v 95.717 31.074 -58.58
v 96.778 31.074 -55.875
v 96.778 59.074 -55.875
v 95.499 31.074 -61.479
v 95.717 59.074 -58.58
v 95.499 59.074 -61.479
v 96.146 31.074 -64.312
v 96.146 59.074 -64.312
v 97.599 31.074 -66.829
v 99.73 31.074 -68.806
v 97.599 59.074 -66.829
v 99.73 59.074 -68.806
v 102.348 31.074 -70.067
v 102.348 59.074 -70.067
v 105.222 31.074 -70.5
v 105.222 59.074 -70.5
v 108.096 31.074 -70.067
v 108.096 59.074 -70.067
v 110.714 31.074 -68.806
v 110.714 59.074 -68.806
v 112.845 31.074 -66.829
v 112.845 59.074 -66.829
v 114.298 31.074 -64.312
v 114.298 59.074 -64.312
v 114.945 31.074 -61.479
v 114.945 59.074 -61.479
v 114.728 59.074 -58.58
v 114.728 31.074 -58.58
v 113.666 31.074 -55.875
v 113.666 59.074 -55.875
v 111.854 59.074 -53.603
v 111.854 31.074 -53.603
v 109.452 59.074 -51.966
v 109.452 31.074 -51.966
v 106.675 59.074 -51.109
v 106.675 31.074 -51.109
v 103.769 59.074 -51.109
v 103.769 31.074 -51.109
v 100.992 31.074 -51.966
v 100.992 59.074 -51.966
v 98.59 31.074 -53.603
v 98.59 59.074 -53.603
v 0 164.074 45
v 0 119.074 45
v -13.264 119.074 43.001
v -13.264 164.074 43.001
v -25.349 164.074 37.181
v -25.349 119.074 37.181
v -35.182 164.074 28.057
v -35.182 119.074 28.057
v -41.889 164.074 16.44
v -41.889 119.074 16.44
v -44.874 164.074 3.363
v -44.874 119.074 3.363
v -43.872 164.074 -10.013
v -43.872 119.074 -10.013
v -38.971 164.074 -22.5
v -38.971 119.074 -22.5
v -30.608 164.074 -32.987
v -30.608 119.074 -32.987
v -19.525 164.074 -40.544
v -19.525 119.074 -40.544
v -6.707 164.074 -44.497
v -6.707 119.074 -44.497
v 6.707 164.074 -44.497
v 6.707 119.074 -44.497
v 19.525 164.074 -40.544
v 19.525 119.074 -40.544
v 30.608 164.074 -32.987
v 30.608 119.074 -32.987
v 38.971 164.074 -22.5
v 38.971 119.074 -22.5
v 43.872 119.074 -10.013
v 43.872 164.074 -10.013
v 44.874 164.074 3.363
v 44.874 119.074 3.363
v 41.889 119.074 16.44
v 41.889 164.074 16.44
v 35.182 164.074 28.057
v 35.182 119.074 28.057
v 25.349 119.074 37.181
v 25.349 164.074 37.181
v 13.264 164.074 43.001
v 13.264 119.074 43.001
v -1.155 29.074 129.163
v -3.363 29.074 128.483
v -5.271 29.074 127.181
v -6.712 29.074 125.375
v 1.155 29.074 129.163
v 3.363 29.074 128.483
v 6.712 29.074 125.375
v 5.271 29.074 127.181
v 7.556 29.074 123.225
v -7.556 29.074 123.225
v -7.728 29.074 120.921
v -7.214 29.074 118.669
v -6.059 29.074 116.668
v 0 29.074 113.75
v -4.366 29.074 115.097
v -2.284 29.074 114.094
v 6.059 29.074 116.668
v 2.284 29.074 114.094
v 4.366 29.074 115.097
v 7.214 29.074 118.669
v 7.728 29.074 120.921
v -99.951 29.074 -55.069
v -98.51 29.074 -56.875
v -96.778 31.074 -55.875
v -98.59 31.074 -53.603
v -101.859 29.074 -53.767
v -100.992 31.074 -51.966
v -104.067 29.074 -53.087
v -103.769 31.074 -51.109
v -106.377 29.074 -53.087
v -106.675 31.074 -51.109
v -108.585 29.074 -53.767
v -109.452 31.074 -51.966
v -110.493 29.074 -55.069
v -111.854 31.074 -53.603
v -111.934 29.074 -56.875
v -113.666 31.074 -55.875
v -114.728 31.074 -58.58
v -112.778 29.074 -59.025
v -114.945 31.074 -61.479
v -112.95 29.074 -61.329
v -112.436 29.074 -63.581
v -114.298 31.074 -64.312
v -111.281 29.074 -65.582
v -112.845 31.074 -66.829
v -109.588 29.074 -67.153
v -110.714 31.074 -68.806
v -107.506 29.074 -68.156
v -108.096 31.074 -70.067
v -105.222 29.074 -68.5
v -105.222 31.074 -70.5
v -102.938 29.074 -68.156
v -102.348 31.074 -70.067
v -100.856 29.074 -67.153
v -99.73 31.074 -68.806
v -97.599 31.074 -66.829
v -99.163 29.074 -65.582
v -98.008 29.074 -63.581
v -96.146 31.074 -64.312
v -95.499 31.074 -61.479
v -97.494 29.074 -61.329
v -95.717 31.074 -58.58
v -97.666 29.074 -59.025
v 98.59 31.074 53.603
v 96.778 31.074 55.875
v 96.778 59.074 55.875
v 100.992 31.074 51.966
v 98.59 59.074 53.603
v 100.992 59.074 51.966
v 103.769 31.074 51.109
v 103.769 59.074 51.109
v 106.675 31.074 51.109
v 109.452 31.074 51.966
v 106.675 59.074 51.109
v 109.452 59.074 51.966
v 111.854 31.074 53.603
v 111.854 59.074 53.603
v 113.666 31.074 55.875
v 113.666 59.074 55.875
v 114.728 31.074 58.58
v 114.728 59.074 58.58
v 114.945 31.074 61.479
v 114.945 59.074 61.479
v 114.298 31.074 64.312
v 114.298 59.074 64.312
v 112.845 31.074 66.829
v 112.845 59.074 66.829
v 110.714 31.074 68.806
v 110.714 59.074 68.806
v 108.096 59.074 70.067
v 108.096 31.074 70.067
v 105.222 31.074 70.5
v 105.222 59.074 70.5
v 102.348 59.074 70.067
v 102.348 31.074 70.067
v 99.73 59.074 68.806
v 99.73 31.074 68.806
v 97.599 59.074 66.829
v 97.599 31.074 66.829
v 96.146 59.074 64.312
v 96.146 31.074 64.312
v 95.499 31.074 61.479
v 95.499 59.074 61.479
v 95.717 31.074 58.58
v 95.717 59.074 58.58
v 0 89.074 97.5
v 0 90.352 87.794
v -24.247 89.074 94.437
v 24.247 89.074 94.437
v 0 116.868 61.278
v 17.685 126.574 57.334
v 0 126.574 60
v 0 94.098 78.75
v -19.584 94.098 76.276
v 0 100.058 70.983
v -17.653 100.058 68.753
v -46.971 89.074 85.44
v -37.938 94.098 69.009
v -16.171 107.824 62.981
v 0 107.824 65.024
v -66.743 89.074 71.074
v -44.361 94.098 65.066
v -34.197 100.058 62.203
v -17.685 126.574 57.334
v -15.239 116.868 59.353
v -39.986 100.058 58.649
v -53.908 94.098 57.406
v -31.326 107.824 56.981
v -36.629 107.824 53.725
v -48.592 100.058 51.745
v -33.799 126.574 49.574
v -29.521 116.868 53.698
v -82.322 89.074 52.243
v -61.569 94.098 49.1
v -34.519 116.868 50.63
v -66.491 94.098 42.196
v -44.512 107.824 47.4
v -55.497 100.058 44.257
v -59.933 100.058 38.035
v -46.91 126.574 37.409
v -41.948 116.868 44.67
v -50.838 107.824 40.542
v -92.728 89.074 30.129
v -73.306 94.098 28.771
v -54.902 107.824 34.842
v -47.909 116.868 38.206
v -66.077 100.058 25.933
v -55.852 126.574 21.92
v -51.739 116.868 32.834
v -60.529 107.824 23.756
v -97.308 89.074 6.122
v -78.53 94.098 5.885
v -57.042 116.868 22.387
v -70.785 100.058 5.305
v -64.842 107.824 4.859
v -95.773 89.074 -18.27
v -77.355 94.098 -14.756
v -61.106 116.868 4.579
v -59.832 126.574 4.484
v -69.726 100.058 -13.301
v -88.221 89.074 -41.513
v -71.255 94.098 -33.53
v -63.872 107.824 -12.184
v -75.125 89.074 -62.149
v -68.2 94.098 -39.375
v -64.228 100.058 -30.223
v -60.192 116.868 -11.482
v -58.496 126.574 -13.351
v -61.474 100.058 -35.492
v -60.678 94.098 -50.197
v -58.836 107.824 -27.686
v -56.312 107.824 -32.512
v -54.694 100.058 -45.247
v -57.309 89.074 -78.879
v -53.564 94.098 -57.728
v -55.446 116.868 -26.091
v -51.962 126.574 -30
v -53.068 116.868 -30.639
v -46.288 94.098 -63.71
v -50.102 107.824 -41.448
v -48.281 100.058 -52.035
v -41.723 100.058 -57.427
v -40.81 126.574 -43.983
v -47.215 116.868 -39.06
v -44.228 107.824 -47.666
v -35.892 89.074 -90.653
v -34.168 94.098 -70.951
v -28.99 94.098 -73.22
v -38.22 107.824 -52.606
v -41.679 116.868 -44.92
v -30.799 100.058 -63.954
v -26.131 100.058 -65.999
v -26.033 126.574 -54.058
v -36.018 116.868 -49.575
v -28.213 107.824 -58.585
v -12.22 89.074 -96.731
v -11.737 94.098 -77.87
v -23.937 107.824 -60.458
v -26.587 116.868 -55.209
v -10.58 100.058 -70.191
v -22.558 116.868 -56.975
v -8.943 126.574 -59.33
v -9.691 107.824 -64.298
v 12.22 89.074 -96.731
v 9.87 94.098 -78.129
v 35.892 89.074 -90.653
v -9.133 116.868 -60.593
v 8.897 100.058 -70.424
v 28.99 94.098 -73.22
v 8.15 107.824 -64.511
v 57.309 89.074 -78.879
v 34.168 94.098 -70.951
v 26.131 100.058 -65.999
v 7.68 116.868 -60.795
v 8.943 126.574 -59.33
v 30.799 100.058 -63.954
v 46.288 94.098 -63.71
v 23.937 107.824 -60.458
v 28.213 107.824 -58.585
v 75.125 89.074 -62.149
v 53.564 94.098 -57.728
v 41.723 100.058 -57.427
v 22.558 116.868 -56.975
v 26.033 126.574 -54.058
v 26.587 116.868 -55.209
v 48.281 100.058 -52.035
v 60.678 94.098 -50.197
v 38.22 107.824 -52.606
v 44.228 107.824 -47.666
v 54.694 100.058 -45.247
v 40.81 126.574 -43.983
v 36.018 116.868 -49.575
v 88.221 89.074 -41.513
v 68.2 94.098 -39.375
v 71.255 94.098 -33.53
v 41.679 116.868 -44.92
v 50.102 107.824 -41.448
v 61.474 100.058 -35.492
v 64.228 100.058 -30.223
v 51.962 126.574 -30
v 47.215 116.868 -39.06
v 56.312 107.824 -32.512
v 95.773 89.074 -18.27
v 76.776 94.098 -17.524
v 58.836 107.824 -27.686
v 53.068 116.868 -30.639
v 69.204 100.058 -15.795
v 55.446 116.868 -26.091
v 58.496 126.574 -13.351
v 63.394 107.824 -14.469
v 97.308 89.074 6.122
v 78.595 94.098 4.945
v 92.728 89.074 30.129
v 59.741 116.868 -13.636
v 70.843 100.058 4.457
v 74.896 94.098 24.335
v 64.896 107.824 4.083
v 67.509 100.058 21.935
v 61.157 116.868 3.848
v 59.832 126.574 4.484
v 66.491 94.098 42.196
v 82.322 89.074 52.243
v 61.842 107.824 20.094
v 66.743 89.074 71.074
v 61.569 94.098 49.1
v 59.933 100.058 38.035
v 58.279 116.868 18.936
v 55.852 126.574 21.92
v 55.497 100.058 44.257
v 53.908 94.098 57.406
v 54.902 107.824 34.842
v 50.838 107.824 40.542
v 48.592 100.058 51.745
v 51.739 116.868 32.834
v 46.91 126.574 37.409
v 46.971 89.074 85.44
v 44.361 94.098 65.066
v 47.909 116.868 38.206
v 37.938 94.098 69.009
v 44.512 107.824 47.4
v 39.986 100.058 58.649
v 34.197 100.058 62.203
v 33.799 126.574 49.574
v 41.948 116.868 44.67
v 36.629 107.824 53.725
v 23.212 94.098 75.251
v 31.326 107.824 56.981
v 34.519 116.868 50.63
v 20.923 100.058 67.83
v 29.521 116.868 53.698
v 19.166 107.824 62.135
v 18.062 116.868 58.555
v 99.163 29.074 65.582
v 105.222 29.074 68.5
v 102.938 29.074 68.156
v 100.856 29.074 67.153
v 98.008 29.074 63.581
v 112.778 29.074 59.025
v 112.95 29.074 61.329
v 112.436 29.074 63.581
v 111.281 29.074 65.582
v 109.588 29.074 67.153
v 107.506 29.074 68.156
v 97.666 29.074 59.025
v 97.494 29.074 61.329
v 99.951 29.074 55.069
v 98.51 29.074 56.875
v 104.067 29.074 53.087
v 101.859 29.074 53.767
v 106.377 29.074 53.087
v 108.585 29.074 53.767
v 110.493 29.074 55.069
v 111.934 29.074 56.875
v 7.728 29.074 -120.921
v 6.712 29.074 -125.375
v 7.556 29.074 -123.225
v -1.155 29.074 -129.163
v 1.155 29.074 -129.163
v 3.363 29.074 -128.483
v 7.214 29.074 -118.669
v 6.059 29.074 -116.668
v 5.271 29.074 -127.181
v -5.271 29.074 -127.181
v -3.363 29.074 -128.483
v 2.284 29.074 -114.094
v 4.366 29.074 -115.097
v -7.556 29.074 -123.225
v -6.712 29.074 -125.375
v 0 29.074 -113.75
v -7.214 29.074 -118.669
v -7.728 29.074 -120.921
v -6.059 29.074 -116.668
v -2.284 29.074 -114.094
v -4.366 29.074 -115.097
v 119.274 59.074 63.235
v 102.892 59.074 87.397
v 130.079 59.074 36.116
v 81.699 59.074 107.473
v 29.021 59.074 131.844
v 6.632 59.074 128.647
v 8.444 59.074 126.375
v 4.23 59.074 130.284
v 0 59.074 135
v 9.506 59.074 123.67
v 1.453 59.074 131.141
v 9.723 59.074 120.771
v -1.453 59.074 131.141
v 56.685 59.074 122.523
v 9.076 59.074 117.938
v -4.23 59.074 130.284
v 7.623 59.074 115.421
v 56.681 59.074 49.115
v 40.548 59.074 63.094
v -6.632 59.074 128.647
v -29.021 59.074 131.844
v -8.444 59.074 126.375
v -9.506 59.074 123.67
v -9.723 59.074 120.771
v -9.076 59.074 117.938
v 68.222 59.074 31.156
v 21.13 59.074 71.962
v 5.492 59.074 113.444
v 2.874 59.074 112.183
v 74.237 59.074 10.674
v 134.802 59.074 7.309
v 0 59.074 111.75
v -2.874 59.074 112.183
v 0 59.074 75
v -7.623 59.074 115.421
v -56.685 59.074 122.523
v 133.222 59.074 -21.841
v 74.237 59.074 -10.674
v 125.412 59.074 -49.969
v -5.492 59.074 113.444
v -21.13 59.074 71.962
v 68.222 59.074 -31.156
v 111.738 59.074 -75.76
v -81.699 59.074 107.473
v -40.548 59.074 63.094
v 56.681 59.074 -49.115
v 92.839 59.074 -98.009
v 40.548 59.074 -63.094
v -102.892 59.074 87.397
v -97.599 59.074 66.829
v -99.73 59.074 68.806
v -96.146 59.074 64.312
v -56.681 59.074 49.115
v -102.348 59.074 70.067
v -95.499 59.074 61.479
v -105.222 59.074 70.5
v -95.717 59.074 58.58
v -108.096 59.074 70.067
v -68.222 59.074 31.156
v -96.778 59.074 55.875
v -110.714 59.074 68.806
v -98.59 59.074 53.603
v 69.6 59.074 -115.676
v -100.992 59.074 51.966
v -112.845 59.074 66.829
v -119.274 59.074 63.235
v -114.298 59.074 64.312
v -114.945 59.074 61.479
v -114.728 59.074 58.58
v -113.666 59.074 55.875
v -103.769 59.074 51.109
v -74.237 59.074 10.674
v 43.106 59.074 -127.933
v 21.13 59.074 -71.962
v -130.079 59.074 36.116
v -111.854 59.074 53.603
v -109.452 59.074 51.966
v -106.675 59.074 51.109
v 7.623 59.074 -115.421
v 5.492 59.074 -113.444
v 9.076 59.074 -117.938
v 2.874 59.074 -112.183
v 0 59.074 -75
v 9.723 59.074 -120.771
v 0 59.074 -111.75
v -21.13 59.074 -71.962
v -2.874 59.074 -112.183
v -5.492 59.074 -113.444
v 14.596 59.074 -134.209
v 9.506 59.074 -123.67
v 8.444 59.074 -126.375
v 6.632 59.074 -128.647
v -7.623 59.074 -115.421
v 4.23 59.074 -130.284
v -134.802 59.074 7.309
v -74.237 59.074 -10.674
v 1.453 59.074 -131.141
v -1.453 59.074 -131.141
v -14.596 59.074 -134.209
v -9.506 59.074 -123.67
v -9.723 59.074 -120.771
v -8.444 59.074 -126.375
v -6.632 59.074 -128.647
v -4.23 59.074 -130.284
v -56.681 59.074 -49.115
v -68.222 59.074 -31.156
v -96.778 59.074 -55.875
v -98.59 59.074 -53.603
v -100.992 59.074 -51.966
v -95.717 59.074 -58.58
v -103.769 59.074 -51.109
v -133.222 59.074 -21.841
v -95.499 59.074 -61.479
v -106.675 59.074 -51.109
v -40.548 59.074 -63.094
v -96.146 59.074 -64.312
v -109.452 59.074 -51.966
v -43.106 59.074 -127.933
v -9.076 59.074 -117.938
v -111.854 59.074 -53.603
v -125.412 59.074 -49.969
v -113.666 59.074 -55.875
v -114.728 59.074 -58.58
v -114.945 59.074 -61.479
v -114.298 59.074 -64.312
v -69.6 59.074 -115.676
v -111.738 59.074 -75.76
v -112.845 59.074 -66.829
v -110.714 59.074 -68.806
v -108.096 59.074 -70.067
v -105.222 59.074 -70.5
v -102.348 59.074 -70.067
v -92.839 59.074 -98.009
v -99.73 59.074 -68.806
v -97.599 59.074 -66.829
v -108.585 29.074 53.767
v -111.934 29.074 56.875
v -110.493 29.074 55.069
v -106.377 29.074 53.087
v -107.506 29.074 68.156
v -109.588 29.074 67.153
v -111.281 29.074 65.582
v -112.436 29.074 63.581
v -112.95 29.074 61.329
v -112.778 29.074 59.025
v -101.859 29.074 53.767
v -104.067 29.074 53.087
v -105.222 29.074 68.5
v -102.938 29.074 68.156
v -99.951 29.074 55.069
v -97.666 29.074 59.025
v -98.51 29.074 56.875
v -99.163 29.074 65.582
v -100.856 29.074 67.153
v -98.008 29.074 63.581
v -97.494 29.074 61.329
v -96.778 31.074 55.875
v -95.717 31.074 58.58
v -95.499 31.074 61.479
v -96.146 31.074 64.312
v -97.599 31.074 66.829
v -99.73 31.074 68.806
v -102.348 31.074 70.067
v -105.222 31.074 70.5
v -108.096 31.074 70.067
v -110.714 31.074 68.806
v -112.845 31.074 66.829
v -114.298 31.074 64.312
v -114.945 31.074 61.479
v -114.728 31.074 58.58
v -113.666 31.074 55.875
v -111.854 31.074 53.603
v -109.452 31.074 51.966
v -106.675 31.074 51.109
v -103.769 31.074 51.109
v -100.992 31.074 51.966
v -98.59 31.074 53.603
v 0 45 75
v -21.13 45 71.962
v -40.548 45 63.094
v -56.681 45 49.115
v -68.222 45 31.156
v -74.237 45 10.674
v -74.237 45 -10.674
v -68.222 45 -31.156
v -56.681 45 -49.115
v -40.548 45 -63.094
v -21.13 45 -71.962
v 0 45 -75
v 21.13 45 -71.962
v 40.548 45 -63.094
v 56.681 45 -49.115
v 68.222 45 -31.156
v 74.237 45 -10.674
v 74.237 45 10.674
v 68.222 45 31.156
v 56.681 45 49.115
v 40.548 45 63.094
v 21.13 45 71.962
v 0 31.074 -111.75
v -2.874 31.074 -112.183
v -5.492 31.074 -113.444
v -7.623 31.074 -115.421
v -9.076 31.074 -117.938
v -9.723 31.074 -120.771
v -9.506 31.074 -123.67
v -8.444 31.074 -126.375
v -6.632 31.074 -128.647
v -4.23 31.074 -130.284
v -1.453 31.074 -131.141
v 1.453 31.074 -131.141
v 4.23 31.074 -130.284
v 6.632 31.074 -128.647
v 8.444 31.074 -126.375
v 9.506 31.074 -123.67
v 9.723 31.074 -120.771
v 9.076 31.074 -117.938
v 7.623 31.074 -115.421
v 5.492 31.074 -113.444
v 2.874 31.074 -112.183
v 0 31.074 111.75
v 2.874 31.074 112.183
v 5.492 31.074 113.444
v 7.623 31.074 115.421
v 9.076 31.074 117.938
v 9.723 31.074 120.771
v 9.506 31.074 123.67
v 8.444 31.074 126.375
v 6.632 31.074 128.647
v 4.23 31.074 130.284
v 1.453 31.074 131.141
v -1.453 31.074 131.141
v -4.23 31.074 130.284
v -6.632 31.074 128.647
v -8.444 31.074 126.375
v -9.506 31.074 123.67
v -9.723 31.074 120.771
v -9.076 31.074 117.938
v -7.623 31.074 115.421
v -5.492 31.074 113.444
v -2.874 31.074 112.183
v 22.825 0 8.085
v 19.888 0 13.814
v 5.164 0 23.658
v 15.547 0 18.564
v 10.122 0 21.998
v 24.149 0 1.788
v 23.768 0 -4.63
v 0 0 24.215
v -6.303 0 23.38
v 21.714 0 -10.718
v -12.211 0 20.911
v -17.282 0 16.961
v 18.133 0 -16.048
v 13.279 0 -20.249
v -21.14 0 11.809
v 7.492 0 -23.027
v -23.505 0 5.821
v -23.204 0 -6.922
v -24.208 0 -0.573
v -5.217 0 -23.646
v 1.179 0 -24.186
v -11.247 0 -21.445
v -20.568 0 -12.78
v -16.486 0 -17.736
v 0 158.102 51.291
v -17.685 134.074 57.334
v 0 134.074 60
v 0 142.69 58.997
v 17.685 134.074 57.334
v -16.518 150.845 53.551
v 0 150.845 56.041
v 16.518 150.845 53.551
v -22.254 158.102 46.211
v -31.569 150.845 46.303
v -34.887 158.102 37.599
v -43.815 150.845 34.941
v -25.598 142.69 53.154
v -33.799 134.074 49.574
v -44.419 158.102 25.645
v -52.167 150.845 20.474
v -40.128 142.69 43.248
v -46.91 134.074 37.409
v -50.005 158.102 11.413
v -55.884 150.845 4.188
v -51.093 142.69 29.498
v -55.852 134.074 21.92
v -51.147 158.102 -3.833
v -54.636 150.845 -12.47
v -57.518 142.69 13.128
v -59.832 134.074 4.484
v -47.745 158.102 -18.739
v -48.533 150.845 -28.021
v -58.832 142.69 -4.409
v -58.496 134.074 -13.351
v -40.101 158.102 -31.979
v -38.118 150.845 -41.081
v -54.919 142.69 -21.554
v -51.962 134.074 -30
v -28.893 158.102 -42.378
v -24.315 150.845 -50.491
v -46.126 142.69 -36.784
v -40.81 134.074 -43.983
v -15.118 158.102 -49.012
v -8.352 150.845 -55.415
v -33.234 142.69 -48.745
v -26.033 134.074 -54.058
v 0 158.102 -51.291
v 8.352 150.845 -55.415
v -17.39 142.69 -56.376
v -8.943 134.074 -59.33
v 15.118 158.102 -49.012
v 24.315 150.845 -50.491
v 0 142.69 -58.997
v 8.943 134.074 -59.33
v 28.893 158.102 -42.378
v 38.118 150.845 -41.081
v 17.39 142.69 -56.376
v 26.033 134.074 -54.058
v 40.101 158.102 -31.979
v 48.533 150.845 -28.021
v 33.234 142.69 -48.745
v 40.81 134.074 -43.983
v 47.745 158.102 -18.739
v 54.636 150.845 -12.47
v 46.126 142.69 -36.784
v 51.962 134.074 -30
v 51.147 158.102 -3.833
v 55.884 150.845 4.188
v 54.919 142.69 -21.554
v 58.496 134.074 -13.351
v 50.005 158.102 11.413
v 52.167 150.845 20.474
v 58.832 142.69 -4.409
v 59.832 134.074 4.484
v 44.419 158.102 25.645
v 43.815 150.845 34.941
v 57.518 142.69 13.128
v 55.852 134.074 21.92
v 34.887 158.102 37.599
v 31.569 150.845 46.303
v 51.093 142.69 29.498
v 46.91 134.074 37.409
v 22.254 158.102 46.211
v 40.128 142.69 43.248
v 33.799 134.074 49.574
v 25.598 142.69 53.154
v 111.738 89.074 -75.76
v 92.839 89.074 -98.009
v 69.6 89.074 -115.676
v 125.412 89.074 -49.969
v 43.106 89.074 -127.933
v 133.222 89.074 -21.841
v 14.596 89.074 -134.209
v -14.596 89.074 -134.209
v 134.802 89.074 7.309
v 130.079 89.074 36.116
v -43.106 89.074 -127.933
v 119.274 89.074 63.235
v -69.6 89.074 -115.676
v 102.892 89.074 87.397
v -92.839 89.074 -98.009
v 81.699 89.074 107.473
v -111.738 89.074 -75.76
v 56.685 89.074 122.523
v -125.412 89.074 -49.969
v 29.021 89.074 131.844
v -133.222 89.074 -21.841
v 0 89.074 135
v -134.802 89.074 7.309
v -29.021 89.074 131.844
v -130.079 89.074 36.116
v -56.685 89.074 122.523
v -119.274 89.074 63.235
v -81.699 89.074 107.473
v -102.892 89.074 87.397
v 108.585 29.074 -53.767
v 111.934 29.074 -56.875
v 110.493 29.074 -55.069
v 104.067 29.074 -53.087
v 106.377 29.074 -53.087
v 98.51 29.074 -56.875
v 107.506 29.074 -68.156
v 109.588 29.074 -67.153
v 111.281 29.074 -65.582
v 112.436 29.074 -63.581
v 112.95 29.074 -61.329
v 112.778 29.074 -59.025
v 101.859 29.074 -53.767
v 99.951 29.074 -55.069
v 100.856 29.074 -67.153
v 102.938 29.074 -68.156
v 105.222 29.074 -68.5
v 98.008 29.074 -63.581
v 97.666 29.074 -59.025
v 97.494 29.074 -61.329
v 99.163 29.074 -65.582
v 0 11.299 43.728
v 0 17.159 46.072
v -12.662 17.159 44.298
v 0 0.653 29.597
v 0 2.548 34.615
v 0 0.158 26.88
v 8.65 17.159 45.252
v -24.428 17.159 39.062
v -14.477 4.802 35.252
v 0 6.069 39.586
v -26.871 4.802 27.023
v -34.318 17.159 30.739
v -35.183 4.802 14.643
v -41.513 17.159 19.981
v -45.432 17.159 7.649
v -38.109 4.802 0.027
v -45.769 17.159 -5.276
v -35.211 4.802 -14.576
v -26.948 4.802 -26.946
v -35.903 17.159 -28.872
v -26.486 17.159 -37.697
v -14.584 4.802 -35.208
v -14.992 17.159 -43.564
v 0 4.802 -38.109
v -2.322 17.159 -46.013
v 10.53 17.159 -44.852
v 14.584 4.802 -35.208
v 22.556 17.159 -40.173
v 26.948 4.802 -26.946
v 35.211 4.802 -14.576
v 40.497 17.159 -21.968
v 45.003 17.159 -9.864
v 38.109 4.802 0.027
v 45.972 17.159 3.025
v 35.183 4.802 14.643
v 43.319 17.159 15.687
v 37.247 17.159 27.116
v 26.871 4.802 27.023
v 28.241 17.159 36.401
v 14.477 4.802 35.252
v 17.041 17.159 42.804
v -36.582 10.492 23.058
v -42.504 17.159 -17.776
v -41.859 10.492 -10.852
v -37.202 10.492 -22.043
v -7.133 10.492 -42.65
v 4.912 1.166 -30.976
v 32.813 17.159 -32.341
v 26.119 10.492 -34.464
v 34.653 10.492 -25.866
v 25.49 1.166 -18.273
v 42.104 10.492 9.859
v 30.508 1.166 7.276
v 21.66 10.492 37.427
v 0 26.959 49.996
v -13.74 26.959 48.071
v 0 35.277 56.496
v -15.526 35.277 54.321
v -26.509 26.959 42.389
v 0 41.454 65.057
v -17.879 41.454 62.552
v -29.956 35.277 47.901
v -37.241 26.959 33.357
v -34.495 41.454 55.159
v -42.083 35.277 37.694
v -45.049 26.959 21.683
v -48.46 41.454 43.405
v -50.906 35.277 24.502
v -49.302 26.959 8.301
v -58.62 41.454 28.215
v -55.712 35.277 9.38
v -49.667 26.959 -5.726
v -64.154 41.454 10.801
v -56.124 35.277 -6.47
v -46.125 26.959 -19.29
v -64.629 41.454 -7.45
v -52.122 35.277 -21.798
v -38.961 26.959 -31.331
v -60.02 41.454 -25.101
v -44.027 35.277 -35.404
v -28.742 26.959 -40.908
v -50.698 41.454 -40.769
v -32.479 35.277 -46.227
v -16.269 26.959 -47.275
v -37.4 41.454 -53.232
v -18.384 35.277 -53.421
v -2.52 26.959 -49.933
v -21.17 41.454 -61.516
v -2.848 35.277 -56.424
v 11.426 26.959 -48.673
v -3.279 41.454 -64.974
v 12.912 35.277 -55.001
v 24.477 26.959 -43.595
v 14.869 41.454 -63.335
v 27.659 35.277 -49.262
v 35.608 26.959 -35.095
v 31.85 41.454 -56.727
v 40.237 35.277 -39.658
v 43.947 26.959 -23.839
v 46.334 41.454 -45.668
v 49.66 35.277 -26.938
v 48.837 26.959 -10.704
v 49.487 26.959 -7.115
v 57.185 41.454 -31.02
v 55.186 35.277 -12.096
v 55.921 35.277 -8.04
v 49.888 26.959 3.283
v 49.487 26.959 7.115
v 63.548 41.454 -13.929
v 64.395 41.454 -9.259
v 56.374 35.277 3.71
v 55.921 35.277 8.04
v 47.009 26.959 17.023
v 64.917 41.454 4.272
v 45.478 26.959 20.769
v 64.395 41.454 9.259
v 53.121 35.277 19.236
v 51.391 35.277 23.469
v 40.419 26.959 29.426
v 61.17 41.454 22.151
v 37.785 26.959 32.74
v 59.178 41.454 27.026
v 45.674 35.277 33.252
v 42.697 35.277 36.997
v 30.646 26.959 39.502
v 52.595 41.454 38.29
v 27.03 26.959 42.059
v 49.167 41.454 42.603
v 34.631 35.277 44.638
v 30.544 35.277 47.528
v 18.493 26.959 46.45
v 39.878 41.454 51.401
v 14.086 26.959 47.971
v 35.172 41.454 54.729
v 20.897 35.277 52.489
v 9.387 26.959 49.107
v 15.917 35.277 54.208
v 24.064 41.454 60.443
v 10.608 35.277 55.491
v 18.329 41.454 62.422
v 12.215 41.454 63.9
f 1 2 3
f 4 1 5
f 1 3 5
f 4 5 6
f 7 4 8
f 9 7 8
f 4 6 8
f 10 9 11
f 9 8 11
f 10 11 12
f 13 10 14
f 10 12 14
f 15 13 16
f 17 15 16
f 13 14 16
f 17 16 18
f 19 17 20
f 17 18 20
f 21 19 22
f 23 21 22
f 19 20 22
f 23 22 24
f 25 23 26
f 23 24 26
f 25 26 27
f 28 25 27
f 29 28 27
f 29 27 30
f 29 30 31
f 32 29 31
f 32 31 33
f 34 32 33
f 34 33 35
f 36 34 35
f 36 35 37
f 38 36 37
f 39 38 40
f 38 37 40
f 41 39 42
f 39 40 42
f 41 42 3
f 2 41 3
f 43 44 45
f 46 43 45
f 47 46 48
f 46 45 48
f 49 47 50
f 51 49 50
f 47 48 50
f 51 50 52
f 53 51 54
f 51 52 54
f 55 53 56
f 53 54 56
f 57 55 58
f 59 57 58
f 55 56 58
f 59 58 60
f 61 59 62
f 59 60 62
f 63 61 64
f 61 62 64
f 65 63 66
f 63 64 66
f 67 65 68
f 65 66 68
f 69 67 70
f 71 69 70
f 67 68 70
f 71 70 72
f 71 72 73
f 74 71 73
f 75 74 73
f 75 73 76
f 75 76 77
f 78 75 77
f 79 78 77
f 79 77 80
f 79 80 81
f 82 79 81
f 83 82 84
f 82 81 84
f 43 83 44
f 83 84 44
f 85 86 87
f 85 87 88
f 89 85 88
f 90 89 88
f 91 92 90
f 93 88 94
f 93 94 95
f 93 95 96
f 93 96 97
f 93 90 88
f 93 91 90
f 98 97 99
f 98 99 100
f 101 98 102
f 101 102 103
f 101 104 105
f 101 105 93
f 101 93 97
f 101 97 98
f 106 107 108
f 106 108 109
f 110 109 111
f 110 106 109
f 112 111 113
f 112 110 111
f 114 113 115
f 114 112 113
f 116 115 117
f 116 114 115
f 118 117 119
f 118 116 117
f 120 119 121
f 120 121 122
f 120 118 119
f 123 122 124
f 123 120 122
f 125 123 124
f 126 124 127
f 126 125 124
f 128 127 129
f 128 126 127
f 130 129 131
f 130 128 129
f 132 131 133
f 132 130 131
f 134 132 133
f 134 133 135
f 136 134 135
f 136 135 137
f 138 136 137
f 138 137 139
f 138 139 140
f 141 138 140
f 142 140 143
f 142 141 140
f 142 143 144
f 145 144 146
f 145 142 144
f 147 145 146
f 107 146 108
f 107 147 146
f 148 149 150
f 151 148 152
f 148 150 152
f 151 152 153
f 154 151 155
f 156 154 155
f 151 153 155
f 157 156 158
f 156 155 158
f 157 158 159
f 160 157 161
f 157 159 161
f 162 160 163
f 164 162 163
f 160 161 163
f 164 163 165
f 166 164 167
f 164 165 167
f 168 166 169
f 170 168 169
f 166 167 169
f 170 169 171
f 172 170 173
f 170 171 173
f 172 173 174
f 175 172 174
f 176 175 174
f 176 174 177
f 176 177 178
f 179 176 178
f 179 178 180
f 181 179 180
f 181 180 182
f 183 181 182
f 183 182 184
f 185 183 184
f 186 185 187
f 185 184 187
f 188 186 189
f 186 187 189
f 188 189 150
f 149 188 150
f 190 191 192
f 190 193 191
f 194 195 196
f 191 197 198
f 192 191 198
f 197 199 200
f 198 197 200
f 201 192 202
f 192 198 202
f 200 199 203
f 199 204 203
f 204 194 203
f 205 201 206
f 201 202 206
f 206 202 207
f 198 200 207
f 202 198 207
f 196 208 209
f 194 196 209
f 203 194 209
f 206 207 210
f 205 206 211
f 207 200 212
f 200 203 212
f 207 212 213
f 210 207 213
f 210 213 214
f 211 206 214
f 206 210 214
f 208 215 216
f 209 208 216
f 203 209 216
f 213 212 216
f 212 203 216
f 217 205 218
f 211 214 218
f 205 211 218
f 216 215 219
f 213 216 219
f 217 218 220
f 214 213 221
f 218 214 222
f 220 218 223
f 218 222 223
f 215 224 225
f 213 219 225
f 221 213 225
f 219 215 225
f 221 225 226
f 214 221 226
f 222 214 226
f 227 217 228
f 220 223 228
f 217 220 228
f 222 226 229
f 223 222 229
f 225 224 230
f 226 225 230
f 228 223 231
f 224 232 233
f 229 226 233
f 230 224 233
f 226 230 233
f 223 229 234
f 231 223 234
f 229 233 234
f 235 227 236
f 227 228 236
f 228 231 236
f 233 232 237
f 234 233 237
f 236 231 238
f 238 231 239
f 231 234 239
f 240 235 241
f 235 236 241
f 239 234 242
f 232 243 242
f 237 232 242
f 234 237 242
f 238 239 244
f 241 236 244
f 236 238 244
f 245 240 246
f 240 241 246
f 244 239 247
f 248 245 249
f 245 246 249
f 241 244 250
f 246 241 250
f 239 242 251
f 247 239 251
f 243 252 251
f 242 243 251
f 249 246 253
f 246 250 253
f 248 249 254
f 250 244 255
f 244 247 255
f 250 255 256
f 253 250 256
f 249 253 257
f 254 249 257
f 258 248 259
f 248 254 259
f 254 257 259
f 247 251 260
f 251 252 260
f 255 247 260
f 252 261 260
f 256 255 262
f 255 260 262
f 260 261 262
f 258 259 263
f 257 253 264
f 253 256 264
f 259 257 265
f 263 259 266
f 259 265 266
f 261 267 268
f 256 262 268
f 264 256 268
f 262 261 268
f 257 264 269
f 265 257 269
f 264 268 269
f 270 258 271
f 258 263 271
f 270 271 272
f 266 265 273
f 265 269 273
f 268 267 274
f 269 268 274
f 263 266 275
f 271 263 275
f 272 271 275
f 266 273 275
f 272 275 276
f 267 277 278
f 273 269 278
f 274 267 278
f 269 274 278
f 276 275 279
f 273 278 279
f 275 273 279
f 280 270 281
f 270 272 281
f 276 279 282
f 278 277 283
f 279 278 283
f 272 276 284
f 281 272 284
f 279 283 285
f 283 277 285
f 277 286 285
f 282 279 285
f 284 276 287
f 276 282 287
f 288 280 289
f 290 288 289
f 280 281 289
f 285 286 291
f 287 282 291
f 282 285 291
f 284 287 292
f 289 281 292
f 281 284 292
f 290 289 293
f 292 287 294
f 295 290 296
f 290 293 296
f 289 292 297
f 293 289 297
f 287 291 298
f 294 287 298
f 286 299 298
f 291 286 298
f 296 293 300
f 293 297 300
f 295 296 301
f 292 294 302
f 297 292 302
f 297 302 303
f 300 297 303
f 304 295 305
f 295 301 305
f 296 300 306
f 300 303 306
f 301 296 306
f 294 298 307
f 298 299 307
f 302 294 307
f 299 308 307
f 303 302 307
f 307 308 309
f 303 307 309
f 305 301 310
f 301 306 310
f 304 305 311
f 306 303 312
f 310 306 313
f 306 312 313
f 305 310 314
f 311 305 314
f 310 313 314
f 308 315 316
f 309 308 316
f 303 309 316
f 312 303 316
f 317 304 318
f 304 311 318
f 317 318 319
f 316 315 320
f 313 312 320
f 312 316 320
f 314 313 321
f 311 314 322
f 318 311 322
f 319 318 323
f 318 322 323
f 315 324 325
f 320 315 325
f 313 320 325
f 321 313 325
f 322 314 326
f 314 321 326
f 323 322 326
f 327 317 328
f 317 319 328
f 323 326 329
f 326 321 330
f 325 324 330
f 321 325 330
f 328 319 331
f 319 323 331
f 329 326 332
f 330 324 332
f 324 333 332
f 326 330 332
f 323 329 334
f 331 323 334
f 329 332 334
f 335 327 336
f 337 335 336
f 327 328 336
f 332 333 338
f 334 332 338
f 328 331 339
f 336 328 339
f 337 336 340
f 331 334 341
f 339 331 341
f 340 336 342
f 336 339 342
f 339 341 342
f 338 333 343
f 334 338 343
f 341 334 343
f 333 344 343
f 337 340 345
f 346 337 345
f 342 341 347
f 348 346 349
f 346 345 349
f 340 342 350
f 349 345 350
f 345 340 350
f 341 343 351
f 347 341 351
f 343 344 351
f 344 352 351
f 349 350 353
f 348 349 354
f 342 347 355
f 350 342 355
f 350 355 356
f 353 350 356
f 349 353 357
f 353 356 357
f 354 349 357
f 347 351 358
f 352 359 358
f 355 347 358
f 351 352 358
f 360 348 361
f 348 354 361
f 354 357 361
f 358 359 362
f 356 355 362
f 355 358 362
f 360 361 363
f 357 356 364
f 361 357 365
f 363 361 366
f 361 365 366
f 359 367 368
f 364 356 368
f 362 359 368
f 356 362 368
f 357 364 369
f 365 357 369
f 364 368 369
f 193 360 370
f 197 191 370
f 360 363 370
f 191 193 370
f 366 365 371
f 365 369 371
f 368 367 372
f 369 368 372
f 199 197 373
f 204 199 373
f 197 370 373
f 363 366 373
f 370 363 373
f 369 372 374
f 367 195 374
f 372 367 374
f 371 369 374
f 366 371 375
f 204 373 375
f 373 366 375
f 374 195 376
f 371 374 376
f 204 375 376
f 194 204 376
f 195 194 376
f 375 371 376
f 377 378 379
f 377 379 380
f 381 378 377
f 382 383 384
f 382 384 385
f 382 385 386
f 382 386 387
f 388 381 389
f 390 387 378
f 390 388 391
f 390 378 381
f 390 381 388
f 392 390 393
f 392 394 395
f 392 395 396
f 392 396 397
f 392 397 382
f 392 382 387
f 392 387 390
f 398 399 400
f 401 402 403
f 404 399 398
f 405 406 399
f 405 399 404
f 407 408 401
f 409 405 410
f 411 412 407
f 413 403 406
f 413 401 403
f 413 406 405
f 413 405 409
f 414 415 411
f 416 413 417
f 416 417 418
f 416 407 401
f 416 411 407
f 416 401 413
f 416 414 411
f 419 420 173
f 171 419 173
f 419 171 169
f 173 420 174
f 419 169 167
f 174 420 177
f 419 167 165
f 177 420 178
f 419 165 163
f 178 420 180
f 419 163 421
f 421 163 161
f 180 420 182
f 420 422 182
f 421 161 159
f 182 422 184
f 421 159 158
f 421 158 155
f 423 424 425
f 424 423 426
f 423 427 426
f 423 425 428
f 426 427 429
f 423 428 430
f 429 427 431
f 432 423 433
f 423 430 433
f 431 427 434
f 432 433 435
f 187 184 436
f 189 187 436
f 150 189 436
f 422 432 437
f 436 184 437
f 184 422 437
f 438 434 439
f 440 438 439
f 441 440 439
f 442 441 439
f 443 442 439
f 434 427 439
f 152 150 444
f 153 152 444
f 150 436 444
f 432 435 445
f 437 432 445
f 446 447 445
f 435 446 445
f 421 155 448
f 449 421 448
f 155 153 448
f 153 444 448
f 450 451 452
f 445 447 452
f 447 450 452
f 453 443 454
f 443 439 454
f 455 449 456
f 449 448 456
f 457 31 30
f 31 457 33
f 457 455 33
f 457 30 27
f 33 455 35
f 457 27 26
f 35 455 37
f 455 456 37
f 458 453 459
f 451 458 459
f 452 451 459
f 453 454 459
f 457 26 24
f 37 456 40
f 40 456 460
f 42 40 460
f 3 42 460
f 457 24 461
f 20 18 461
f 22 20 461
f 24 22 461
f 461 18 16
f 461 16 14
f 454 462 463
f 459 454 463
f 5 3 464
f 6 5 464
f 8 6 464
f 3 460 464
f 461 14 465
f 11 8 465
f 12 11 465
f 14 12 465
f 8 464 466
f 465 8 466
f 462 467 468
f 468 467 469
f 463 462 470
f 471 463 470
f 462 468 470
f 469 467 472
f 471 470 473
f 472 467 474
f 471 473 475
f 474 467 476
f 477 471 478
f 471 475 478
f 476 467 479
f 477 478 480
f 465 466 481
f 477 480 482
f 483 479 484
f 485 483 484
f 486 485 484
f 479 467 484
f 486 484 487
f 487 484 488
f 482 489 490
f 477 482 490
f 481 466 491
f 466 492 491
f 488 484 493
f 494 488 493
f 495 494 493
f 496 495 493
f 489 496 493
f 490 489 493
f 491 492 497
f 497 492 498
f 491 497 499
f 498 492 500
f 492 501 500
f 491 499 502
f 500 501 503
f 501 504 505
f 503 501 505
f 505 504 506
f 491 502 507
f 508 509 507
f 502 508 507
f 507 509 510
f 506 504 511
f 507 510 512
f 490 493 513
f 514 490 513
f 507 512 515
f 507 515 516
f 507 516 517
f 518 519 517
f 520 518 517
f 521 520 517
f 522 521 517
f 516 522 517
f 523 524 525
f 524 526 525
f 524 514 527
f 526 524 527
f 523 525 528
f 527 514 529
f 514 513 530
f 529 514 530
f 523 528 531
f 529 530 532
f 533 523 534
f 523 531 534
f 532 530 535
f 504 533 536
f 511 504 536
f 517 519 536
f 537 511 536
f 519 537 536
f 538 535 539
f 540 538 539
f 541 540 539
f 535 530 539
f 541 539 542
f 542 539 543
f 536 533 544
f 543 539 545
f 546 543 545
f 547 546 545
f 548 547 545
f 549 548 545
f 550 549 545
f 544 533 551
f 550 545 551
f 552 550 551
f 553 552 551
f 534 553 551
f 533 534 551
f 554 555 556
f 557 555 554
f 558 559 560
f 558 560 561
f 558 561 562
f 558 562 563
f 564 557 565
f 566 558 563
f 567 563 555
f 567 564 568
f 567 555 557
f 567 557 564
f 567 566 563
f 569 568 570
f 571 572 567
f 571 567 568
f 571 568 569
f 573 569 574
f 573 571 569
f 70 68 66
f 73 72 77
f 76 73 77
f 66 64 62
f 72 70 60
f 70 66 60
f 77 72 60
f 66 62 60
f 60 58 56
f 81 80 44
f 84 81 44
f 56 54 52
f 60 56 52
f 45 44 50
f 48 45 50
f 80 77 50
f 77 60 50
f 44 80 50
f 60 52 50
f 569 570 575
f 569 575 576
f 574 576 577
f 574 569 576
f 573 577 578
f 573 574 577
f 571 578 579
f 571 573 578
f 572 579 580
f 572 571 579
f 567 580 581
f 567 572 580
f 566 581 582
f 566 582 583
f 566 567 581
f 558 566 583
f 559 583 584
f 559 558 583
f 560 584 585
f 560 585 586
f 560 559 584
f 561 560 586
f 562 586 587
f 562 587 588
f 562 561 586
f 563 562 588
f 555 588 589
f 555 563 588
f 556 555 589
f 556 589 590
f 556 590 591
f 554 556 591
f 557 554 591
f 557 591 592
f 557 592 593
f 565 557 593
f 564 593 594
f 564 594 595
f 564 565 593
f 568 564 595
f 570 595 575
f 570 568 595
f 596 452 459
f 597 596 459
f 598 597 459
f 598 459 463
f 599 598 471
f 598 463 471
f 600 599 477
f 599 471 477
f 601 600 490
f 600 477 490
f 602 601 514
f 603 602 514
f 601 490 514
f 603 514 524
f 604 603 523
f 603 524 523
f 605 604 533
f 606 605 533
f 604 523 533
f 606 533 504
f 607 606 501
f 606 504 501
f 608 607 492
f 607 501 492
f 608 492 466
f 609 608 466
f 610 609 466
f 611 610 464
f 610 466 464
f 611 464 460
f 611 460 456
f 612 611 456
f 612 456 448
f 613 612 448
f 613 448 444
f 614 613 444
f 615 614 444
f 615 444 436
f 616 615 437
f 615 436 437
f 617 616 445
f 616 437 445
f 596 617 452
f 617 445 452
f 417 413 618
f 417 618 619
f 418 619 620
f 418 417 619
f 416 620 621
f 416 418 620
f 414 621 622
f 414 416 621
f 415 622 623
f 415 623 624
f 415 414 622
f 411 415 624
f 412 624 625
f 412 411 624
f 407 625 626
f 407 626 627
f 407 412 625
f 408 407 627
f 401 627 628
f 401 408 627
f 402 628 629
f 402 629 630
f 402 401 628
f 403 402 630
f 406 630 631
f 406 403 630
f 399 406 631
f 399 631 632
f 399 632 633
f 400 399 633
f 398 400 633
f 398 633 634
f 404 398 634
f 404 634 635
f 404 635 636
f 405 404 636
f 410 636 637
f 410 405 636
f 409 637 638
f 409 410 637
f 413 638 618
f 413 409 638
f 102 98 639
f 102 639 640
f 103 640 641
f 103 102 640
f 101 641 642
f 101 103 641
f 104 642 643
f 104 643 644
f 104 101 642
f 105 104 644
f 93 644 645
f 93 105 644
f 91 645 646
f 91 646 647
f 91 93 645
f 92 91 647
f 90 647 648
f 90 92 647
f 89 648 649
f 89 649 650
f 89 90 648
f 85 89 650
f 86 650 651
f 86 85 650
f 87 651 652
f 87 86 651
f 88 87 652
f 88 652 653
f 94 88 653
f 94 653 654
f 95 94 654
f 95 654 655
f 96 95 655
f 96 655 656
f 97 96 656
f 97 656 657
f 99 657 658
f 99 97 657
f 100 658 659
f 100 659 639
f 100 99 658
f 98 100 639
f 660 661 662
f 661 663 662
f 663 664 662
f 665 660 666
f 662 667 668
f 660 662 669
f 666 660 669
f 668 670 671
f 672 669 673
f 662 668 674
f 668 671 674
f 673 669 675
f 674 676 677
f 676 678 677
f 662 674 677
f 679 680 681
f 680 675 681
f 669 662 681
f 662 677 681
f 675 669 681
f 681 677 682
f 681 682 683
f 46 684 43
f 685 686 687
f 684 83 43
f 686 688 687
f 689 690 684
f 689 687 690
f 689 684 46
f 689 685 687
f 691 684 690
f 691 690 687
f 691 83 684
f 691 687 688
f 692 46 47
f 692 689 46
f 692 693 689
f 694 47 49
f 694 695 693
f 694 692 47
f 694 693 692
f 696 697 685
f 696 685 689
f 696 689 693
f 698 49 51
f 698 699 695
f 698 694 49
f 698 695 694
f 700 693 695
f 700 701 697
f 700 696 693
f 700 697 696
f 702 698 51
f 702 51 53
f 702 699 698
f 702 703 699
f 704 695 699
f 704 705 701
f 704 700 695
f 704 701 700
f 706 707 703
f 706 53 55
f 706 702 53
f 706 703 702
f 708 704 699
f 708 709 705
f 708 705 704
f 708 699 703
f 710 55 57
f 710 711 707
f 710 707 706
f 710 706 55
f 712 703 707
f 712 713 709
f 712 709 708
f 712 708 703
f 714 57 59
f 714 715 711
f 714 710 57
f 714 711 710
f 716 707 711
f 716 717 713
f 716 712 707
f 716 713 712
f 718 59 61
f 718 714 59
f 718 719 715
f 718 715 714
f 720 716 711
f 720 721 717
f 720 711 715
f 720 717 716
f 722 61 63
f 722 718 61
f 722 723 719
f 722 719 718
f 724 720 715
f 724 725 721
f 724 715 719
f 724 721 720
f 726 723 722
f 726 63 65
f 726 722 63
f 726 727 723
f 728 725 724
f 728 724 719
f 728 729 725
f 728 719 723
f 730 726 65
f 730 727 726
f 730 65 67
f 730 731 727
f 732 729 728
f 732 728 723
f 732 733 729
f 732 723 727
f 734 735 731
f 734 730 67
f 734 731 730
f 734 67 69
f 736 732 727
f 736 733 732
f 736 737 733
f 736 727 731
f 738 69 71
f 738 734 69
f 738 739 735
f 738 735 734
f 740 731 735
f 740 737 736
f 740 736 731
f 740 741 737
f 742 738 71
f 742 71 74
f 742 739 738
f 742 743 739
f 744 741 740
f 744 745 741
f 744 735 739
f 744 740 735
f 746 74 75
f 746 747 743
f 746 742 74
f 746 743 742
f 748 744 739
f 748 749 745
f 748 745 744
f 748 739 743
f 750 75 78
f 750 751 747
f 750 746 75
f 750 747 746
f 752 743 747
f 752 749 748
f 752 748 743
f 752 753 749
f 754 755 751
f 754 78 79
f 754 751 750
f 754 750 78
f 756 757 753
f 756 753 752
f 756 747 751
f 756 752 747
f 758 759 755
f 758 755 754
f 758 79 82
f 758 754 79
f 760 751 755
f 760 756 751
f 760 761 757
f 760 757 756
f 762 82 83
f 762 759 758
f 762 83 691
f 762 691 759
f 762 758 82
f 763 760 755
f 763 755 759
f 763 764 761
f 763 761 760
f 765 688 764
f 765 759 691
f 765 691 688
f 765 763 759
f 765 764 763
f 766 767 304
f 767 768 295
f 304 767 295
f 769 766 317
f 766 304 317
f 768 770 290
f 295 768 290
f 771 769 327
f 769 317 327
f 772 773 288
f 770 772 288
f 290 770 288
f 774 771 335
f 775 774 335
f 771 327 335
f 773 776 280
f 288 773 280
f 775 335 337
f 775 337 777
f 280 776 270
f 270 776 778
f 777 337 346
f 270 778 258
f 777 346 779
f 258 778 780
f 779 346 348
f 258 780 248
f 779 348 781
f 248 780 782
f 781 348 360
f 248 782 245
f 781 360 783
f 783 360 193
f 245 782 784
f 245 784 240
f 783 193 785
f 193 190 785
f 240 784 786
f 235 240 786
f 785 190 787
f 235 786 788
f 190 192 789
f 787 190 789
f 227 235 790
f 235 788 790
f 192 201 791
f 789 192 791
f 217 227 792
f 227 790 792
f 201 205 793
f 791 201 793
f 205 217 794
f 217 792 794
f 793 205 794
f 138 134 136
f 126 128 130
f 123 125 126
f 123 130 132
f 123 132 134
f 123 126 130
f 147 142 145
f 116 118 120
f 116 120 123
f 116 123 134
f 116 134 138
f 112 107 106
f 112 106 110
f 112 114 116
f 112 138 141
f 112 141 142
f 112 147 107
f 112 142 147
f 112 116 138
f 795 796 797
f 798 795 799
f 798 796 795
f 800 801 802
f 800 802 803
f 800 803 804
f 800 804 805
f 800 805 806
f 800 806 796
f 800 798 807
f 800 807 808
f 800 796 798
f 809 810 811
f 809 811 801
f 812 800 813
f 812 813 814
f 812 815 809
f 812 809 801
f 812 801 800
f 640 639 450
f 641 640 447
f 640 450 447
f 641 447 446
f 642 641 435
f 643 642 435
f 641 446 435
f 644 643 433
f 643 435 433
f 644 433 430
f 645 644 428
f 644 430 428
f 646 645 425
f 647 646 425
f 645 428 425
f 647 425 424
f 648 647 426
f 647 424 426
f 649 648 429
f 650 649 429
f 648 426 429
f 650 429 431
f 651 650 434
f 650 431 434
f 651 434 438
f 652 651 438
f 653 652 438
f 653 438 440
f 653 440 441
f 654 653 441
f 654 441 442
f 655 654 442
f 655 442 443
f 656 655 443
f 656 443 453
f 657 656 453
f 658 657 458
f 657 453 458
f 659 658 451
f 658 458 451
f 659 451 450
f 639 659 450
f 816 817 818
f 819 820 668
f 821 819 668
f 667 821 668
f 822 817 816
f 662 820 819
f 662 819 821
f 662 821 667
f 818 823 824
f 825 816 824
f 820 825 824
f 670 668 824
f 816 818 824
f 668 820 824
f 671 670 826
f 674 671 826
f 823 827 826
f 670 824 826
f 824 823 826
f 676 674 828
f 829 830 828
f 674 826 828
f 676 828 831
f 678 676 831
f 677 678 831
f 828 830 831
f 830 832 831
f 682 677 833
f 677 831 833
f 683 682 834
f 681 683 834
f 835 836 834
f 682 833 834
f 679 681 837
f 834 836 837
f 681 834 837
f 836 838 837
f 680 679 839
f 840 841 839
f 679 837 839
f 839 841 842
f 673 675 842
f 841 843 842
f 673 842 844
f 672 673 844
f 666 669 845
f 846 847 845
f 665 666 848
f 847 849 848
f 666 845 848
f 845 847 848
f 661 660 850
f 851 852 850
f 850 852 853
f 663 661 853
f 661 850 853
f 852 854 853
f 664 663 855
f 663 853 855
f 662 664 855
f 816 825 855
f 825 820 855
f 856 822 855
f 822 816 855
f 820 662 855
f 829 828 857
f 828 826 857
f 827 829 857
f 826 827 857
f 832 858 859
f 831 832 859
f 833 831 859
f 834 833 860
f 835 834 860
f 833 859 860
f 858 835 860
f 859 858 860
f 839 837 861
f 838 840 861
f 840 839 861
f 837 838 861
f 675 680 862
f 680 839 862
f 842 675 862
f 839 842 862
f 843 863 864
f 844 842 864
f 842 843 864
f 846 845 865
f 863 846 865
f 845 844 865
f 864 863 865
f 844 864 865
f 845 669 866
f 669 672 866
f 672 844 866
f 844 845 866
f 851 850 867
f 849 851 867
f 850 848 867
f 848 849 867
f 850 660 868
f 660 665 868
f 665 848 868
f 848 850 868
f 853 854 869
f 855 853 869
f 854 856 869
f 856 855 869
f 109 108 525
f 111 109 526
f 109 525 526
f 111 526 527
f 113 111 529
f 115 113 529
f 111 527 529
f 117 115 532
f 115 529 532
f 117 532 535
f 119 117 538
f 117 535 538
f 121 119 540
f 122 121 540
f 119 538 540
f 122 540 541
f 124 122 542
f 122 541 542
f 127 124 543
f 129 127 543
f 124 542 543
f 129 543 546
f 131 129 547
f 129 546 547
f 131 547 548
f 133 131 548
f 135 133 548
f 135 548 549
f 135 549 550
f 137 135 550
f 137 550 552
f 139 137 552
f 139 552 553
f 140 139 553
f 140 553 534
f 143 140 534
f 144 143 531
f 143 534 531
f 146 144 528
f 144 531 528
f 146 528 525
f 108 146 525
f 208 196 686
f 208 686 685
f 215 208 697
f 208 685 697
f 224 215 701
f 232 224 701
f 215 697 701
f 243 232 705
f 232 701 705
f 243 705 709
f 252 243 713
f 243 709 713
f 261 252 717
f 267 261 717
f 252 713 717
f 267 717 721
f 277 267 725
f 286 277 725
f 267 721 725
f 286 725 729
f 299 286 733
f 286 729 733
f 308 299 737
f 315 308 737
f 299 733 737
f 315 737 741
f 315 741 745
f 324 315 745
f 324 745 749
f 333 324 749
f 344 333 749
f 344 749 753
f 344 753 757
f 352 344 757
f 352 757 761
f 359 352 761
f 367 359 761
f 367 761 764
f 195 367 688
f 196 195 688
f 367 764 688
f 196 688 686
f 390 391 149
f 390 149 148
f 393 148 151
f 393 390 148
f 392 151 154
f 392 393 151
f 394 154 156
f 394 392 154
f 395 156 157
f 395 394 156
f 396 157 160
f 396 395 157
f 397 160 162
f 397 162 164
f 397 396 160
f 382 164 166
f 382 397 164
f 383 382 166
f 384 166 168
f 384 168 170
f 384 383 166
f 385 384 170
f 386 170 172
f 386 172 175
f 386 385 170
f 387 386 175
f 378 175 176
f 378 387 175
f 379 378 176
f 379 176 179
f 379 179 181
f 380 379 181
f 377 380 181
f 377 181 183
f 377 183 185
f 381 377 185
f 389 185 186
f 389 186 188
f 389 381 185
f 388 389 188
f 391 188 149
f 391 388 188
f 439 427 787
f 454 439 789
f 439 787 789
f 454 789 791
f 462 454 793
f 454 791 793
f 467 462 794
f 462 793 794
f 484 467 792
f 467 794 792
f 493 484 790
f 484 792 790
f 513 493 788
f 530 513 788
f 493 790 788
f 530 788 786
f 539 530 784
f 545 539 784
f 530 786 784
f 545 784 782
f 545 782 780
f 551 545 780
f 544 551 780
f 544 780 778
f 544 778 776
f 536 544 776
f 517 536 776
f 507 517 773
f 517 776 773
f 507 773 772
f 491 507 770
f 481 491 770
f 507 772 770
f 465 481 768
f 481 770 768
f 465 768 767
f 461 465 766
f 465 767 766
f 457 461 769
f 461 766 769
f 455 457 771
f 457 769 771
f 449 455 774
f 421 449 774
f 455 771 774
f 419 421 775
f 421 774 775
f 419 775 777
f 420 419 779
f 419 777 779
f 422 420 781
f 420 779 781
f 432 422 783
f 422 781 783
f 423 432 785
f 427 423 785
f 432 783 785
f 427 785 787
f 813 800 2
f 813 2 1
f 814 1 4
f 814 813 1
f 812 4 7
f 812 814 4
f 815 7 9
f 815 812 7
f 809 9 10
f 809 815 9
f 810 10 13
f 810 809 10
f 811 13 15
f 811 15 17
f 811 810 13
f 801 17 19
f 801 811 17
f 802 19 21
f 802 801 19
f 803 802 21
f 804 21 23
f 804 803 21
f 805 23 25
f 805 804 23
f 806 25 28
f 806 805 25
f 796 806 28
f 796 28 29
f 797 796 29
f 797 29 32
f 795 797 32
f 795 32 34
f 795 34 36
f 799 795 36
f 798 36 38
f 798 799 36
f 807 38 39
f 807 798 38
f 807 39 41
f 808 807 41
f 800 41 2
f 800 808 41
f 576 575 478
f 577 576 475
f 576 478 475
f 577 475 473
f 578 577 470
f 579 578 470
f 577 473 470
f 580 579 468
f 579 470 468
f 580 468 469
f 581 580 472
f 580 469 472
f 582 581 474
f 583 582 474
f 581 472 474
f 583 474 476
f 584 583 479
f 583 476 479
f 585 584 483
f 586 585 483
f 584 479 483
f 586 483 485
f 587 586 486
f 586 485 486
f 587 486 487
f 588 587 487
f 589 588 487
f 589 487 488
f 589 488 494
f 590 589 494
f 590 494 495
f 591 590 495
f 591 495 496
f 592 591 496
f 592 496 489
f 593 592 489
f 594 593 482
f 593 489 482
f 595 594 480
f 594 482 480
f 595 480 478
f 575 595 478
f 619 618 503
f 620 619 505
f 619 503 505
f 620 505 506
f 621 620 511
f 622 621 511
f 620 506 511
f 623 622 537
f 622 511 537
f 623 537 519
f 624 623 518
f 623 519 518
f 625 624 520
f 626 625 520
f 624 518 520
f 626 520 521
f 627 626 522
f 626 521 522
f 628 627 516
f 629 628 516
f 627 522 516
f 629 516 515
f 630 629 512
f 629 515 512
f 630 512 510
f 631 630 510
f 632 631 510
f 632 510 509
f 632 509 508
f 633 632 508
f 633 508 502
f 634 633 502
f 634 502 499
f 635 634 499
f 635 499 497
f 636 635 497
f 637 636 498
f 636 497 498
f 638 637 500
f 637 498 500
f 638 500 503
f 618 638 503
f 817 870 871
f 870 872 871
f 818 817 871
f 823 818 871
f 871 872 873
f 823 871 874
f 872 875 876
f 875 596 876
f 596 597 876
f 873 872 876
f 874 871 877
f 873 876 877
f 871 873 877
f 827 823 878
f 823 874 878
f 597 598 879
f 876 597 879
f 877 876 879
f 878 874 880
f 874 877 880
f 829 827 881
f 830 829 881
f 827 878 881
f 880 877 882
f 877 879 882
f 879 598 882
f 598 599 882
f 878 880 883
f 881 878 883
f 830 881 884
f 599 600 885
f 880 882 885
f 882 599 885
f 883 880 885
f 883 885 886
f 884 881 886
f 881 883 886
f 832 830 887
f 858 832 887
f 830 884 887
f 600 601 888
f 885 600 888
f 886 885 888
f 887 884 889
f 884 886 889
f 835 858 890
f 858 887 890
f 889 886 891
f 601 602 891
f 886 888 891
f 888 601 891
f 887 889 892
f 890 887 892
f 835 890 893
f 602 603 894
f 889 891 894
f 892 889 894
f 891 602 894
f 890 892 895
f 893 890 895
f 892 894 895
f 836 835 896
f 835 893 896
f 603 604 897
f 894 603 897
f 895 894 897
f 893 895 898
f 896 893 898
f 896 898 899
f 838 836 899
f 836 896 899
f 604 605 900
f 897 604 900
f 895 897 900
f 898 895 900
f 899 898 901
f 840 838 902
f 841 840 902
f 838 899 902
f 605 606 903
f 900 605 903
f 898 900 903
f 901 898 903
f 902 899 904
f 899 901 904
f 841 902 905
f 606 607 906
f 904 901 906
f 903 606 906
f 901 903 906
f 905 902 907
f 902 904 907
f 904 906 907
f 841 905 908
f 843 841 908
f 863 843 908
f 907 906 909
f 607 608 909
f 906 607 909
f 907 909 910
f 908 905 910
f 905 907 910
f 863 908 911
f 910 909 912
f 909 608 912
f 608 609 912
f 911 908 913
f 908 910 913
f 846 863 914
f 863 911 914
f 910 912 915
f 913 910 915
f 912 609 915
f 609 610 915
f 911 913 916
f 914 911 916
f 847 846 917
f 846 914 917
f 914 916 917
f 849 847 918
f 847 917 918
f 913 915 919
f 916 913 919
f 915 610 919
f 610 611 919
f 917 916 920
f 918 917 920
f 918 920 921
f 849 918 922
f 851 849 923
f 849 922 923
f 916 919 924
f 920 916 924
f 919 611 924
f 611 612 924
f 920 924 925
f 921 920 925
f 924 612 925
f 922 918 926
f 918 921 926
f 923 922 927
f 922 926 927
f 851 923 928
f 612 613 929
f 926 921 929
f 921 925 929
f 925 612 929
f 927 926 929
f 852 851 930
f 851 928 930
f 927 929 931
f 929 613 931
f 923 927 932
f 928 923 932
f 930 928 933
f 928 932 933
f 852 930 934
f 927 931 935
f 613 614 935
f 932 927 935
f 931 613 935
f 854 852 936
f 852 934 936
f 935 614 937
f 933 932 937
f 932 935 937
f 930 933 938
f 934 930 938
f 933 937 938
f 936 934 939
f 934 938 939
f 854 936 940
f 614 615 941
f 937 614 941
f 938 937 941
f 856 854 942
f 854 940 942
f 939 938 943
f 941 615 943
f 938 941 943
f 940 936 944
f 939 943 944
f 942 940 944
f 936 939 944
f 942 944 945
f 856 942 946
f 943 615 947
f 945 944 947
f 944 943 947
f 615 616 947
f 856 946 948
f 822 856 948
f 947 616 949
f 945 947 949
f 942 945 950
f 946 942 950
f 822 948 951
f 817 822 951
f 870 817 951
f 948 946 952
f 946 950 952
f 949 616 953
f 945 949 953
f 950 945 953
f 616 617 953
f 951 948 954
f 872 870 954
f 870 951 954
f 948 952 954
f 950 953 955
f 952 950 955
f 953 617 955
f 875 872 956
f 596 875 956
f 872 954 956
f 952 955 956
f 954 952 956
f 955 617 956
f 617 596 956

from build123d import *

# Parameters (mm, degrees)
FILLET1_R                    = 37.5
FILLET6_R                    = 37.5
FILLET8_R                    = 22.5
SKETCH4_R                    = 9.749999999999996
BOSS_EXTRUDE2_DEPTH          = 30
CHAMFER1_SIZE                = 2
CIRPATTERN4_COUNT            = 6
CHAMFER1_OF_CIRPATTERN4_SIZE = 2


with BuildPart() as part:
    # Sketch1 → Revolve1 (revolve)
    with BuildSketch(Plane.XY, mode=Mode.PRIVATE) as revolve1_sk:
        Polygon((0, 0), (-45, 0), (-45, 44.99999999999999), (-75.00000000000001, 44.999999999999986), (-75.00000000000001, 59.07407407407406), (-135, 59.074074074074055), (-135, 89.07407407407406), (-60, 89.07407407407405), (-60, 164.07407407407405), (-45.00000000000001, 164.07407407407405), (-45, 119.07407407407403), (0, 119.07407407407403), align=None)
    revolve(revolve1_sk.sketch.rotate(Axis((0, 119.07407407407403, 0), (0, -1, 0)), 270), axis=Axis((0, 119.07407407407403, 0), (0, -1, 0)))

    # Fillet1
    # the kernel refuses this fillet: 37.5 mm, written as the material it adds along each edge
    with BuildSketch(Plane(origin=(0, 89.07407407407405, 0), x_dir=(2.2e-16, 0, 1), z_dir=(1, 0, -2.2e-16))) as fillet1_piece_1:
        with BuildLine():
            CenterArc((60 + FILLET1_R, -FILLET1_R), FILLET1_R, 90, 89.99999999999997)
            Line((60, -FILLET1_R), (60, 0))
            Line((60, 0), (60 + FILLET1_R, -1.421e-14))
        make_face()
    revolve(axis=Axis((0, 89.07407407407405, 0), (0, -1, 0)))
    # the kernel refuses this fillet: 37.5 mm, written as the material it takes off along each edge
    with BuildSketch(Plane(origin=(0, 164.07407407407405, 0), x_dir=(2.2e-16, 0, 1), z_dir=(1, 0, -2.2e-16))) as fillet1_2_piece_1:
        with BuildLine():
            CenterArc((22.5, 30), FILLET1_R, 306.86989764584405, 53.13010235415595)
            Line((45.00000000000001, 0), (60, 0))
            Line((60, 0), (60, 30))
        make_face()
    revolve(axis=Axis((0, 164.07407407407405, 0), (0, -1, 0)), mode=Mode.SUBTRACT)

    # Fillet6
    # the kernel refuses this fillet: 37.5 mm, written as the material it adds along each edge
    with BuildSketch(Plane(origin=(0, 44.999999999999986, 0), x_dir=(2.2e-16, 0, 1), z_dir=(1, 0, -2.2e-16))) as fillet6_piece_1:
        with BuildLine():
            CenterArc((82.5, 36.742346141747674), FILLET6_R, 180, 78.4630409671845)
            Line((45, 36.742346141747674), (44.25, 36.742346141747674))
            Line((44.25, 36.742346141747674), (44.25, 0))
            Line((44.25, 0), (45, -0.75))
            ThreePointArc((45, -0.75), (60.00000000000001, -0.75), (74.85000000000001, -0.7348469228349543))
            Line((74.85000000000001, -0.7348469228349543), (75.00000000000001, 0))
        make_face()
    revolve(axis=Axis((0, 44.999999999999986, 0), (0, -1, 0)))

    # Fillet8
    fillet8_edges = [part.edges().sort_by_distance(p)[0] for p in [
        (-1.55e-14, 0, -45),
    ]]
    fillet(fillet8_edges, radius=FILLET8_R)

    # Sketch4 → Boss-Extrude2 (add)
    with BuildSketch(Plane.XZ.offset(-59.074074074074055)):
        with Locations(Location((0, 121.5, 0), (0, 0, 270))):
            Circle(SKETCH4_R)
    boss_extrude2 = extrude(amount=BOSS_EXTRUDE2_DEPTH)

    # Chamfer1
    chamfer1_edges = [part.edges().sort_by_distance(p)[0] for p in [
        (2.99e-15, 29.074074074074055, 131.25),
    ]]
    chamfer(chamfer1_edges, length=CHAMFER1_SIZE)

    # CirPattern4: Boss-Extrude2 ×6 about axis
    cirpattern4_axis = Axis((1.4387e-13, 0, -3.74e-15), (0, 1, 0))
    for i in range(1, CIRPATTERN4_COUNT):
        add(boss_extrude2.rotate(cirpattern4_axis, i * 360 / CIRPATTERN4_COUNT))

    # Chamfer1 of CirPattern4
    chamfer1_of_cirpattern4_edges = [part.edges().sort_by_distance(p)[0] for p in [
        (113.66583424670763, 29.074074074074055, 65.62500000000014),
        (113.66583424670779, 29.074074074074055, -65.62499999999986),
        (3.0083e-13, 29.074074074074055, -131.25),
        (-113.66583424670732, 29.074074074074055, -65.62500000000018),
        (-113.66583424670749, 29.074074074074055, 65.62499999999989),
    ]]
    chamfer(chamfer1_of_cirpattern4_edges, length=CHAMFER1_OF_CIRPATTERN4_SIZE)


solid = part.part
